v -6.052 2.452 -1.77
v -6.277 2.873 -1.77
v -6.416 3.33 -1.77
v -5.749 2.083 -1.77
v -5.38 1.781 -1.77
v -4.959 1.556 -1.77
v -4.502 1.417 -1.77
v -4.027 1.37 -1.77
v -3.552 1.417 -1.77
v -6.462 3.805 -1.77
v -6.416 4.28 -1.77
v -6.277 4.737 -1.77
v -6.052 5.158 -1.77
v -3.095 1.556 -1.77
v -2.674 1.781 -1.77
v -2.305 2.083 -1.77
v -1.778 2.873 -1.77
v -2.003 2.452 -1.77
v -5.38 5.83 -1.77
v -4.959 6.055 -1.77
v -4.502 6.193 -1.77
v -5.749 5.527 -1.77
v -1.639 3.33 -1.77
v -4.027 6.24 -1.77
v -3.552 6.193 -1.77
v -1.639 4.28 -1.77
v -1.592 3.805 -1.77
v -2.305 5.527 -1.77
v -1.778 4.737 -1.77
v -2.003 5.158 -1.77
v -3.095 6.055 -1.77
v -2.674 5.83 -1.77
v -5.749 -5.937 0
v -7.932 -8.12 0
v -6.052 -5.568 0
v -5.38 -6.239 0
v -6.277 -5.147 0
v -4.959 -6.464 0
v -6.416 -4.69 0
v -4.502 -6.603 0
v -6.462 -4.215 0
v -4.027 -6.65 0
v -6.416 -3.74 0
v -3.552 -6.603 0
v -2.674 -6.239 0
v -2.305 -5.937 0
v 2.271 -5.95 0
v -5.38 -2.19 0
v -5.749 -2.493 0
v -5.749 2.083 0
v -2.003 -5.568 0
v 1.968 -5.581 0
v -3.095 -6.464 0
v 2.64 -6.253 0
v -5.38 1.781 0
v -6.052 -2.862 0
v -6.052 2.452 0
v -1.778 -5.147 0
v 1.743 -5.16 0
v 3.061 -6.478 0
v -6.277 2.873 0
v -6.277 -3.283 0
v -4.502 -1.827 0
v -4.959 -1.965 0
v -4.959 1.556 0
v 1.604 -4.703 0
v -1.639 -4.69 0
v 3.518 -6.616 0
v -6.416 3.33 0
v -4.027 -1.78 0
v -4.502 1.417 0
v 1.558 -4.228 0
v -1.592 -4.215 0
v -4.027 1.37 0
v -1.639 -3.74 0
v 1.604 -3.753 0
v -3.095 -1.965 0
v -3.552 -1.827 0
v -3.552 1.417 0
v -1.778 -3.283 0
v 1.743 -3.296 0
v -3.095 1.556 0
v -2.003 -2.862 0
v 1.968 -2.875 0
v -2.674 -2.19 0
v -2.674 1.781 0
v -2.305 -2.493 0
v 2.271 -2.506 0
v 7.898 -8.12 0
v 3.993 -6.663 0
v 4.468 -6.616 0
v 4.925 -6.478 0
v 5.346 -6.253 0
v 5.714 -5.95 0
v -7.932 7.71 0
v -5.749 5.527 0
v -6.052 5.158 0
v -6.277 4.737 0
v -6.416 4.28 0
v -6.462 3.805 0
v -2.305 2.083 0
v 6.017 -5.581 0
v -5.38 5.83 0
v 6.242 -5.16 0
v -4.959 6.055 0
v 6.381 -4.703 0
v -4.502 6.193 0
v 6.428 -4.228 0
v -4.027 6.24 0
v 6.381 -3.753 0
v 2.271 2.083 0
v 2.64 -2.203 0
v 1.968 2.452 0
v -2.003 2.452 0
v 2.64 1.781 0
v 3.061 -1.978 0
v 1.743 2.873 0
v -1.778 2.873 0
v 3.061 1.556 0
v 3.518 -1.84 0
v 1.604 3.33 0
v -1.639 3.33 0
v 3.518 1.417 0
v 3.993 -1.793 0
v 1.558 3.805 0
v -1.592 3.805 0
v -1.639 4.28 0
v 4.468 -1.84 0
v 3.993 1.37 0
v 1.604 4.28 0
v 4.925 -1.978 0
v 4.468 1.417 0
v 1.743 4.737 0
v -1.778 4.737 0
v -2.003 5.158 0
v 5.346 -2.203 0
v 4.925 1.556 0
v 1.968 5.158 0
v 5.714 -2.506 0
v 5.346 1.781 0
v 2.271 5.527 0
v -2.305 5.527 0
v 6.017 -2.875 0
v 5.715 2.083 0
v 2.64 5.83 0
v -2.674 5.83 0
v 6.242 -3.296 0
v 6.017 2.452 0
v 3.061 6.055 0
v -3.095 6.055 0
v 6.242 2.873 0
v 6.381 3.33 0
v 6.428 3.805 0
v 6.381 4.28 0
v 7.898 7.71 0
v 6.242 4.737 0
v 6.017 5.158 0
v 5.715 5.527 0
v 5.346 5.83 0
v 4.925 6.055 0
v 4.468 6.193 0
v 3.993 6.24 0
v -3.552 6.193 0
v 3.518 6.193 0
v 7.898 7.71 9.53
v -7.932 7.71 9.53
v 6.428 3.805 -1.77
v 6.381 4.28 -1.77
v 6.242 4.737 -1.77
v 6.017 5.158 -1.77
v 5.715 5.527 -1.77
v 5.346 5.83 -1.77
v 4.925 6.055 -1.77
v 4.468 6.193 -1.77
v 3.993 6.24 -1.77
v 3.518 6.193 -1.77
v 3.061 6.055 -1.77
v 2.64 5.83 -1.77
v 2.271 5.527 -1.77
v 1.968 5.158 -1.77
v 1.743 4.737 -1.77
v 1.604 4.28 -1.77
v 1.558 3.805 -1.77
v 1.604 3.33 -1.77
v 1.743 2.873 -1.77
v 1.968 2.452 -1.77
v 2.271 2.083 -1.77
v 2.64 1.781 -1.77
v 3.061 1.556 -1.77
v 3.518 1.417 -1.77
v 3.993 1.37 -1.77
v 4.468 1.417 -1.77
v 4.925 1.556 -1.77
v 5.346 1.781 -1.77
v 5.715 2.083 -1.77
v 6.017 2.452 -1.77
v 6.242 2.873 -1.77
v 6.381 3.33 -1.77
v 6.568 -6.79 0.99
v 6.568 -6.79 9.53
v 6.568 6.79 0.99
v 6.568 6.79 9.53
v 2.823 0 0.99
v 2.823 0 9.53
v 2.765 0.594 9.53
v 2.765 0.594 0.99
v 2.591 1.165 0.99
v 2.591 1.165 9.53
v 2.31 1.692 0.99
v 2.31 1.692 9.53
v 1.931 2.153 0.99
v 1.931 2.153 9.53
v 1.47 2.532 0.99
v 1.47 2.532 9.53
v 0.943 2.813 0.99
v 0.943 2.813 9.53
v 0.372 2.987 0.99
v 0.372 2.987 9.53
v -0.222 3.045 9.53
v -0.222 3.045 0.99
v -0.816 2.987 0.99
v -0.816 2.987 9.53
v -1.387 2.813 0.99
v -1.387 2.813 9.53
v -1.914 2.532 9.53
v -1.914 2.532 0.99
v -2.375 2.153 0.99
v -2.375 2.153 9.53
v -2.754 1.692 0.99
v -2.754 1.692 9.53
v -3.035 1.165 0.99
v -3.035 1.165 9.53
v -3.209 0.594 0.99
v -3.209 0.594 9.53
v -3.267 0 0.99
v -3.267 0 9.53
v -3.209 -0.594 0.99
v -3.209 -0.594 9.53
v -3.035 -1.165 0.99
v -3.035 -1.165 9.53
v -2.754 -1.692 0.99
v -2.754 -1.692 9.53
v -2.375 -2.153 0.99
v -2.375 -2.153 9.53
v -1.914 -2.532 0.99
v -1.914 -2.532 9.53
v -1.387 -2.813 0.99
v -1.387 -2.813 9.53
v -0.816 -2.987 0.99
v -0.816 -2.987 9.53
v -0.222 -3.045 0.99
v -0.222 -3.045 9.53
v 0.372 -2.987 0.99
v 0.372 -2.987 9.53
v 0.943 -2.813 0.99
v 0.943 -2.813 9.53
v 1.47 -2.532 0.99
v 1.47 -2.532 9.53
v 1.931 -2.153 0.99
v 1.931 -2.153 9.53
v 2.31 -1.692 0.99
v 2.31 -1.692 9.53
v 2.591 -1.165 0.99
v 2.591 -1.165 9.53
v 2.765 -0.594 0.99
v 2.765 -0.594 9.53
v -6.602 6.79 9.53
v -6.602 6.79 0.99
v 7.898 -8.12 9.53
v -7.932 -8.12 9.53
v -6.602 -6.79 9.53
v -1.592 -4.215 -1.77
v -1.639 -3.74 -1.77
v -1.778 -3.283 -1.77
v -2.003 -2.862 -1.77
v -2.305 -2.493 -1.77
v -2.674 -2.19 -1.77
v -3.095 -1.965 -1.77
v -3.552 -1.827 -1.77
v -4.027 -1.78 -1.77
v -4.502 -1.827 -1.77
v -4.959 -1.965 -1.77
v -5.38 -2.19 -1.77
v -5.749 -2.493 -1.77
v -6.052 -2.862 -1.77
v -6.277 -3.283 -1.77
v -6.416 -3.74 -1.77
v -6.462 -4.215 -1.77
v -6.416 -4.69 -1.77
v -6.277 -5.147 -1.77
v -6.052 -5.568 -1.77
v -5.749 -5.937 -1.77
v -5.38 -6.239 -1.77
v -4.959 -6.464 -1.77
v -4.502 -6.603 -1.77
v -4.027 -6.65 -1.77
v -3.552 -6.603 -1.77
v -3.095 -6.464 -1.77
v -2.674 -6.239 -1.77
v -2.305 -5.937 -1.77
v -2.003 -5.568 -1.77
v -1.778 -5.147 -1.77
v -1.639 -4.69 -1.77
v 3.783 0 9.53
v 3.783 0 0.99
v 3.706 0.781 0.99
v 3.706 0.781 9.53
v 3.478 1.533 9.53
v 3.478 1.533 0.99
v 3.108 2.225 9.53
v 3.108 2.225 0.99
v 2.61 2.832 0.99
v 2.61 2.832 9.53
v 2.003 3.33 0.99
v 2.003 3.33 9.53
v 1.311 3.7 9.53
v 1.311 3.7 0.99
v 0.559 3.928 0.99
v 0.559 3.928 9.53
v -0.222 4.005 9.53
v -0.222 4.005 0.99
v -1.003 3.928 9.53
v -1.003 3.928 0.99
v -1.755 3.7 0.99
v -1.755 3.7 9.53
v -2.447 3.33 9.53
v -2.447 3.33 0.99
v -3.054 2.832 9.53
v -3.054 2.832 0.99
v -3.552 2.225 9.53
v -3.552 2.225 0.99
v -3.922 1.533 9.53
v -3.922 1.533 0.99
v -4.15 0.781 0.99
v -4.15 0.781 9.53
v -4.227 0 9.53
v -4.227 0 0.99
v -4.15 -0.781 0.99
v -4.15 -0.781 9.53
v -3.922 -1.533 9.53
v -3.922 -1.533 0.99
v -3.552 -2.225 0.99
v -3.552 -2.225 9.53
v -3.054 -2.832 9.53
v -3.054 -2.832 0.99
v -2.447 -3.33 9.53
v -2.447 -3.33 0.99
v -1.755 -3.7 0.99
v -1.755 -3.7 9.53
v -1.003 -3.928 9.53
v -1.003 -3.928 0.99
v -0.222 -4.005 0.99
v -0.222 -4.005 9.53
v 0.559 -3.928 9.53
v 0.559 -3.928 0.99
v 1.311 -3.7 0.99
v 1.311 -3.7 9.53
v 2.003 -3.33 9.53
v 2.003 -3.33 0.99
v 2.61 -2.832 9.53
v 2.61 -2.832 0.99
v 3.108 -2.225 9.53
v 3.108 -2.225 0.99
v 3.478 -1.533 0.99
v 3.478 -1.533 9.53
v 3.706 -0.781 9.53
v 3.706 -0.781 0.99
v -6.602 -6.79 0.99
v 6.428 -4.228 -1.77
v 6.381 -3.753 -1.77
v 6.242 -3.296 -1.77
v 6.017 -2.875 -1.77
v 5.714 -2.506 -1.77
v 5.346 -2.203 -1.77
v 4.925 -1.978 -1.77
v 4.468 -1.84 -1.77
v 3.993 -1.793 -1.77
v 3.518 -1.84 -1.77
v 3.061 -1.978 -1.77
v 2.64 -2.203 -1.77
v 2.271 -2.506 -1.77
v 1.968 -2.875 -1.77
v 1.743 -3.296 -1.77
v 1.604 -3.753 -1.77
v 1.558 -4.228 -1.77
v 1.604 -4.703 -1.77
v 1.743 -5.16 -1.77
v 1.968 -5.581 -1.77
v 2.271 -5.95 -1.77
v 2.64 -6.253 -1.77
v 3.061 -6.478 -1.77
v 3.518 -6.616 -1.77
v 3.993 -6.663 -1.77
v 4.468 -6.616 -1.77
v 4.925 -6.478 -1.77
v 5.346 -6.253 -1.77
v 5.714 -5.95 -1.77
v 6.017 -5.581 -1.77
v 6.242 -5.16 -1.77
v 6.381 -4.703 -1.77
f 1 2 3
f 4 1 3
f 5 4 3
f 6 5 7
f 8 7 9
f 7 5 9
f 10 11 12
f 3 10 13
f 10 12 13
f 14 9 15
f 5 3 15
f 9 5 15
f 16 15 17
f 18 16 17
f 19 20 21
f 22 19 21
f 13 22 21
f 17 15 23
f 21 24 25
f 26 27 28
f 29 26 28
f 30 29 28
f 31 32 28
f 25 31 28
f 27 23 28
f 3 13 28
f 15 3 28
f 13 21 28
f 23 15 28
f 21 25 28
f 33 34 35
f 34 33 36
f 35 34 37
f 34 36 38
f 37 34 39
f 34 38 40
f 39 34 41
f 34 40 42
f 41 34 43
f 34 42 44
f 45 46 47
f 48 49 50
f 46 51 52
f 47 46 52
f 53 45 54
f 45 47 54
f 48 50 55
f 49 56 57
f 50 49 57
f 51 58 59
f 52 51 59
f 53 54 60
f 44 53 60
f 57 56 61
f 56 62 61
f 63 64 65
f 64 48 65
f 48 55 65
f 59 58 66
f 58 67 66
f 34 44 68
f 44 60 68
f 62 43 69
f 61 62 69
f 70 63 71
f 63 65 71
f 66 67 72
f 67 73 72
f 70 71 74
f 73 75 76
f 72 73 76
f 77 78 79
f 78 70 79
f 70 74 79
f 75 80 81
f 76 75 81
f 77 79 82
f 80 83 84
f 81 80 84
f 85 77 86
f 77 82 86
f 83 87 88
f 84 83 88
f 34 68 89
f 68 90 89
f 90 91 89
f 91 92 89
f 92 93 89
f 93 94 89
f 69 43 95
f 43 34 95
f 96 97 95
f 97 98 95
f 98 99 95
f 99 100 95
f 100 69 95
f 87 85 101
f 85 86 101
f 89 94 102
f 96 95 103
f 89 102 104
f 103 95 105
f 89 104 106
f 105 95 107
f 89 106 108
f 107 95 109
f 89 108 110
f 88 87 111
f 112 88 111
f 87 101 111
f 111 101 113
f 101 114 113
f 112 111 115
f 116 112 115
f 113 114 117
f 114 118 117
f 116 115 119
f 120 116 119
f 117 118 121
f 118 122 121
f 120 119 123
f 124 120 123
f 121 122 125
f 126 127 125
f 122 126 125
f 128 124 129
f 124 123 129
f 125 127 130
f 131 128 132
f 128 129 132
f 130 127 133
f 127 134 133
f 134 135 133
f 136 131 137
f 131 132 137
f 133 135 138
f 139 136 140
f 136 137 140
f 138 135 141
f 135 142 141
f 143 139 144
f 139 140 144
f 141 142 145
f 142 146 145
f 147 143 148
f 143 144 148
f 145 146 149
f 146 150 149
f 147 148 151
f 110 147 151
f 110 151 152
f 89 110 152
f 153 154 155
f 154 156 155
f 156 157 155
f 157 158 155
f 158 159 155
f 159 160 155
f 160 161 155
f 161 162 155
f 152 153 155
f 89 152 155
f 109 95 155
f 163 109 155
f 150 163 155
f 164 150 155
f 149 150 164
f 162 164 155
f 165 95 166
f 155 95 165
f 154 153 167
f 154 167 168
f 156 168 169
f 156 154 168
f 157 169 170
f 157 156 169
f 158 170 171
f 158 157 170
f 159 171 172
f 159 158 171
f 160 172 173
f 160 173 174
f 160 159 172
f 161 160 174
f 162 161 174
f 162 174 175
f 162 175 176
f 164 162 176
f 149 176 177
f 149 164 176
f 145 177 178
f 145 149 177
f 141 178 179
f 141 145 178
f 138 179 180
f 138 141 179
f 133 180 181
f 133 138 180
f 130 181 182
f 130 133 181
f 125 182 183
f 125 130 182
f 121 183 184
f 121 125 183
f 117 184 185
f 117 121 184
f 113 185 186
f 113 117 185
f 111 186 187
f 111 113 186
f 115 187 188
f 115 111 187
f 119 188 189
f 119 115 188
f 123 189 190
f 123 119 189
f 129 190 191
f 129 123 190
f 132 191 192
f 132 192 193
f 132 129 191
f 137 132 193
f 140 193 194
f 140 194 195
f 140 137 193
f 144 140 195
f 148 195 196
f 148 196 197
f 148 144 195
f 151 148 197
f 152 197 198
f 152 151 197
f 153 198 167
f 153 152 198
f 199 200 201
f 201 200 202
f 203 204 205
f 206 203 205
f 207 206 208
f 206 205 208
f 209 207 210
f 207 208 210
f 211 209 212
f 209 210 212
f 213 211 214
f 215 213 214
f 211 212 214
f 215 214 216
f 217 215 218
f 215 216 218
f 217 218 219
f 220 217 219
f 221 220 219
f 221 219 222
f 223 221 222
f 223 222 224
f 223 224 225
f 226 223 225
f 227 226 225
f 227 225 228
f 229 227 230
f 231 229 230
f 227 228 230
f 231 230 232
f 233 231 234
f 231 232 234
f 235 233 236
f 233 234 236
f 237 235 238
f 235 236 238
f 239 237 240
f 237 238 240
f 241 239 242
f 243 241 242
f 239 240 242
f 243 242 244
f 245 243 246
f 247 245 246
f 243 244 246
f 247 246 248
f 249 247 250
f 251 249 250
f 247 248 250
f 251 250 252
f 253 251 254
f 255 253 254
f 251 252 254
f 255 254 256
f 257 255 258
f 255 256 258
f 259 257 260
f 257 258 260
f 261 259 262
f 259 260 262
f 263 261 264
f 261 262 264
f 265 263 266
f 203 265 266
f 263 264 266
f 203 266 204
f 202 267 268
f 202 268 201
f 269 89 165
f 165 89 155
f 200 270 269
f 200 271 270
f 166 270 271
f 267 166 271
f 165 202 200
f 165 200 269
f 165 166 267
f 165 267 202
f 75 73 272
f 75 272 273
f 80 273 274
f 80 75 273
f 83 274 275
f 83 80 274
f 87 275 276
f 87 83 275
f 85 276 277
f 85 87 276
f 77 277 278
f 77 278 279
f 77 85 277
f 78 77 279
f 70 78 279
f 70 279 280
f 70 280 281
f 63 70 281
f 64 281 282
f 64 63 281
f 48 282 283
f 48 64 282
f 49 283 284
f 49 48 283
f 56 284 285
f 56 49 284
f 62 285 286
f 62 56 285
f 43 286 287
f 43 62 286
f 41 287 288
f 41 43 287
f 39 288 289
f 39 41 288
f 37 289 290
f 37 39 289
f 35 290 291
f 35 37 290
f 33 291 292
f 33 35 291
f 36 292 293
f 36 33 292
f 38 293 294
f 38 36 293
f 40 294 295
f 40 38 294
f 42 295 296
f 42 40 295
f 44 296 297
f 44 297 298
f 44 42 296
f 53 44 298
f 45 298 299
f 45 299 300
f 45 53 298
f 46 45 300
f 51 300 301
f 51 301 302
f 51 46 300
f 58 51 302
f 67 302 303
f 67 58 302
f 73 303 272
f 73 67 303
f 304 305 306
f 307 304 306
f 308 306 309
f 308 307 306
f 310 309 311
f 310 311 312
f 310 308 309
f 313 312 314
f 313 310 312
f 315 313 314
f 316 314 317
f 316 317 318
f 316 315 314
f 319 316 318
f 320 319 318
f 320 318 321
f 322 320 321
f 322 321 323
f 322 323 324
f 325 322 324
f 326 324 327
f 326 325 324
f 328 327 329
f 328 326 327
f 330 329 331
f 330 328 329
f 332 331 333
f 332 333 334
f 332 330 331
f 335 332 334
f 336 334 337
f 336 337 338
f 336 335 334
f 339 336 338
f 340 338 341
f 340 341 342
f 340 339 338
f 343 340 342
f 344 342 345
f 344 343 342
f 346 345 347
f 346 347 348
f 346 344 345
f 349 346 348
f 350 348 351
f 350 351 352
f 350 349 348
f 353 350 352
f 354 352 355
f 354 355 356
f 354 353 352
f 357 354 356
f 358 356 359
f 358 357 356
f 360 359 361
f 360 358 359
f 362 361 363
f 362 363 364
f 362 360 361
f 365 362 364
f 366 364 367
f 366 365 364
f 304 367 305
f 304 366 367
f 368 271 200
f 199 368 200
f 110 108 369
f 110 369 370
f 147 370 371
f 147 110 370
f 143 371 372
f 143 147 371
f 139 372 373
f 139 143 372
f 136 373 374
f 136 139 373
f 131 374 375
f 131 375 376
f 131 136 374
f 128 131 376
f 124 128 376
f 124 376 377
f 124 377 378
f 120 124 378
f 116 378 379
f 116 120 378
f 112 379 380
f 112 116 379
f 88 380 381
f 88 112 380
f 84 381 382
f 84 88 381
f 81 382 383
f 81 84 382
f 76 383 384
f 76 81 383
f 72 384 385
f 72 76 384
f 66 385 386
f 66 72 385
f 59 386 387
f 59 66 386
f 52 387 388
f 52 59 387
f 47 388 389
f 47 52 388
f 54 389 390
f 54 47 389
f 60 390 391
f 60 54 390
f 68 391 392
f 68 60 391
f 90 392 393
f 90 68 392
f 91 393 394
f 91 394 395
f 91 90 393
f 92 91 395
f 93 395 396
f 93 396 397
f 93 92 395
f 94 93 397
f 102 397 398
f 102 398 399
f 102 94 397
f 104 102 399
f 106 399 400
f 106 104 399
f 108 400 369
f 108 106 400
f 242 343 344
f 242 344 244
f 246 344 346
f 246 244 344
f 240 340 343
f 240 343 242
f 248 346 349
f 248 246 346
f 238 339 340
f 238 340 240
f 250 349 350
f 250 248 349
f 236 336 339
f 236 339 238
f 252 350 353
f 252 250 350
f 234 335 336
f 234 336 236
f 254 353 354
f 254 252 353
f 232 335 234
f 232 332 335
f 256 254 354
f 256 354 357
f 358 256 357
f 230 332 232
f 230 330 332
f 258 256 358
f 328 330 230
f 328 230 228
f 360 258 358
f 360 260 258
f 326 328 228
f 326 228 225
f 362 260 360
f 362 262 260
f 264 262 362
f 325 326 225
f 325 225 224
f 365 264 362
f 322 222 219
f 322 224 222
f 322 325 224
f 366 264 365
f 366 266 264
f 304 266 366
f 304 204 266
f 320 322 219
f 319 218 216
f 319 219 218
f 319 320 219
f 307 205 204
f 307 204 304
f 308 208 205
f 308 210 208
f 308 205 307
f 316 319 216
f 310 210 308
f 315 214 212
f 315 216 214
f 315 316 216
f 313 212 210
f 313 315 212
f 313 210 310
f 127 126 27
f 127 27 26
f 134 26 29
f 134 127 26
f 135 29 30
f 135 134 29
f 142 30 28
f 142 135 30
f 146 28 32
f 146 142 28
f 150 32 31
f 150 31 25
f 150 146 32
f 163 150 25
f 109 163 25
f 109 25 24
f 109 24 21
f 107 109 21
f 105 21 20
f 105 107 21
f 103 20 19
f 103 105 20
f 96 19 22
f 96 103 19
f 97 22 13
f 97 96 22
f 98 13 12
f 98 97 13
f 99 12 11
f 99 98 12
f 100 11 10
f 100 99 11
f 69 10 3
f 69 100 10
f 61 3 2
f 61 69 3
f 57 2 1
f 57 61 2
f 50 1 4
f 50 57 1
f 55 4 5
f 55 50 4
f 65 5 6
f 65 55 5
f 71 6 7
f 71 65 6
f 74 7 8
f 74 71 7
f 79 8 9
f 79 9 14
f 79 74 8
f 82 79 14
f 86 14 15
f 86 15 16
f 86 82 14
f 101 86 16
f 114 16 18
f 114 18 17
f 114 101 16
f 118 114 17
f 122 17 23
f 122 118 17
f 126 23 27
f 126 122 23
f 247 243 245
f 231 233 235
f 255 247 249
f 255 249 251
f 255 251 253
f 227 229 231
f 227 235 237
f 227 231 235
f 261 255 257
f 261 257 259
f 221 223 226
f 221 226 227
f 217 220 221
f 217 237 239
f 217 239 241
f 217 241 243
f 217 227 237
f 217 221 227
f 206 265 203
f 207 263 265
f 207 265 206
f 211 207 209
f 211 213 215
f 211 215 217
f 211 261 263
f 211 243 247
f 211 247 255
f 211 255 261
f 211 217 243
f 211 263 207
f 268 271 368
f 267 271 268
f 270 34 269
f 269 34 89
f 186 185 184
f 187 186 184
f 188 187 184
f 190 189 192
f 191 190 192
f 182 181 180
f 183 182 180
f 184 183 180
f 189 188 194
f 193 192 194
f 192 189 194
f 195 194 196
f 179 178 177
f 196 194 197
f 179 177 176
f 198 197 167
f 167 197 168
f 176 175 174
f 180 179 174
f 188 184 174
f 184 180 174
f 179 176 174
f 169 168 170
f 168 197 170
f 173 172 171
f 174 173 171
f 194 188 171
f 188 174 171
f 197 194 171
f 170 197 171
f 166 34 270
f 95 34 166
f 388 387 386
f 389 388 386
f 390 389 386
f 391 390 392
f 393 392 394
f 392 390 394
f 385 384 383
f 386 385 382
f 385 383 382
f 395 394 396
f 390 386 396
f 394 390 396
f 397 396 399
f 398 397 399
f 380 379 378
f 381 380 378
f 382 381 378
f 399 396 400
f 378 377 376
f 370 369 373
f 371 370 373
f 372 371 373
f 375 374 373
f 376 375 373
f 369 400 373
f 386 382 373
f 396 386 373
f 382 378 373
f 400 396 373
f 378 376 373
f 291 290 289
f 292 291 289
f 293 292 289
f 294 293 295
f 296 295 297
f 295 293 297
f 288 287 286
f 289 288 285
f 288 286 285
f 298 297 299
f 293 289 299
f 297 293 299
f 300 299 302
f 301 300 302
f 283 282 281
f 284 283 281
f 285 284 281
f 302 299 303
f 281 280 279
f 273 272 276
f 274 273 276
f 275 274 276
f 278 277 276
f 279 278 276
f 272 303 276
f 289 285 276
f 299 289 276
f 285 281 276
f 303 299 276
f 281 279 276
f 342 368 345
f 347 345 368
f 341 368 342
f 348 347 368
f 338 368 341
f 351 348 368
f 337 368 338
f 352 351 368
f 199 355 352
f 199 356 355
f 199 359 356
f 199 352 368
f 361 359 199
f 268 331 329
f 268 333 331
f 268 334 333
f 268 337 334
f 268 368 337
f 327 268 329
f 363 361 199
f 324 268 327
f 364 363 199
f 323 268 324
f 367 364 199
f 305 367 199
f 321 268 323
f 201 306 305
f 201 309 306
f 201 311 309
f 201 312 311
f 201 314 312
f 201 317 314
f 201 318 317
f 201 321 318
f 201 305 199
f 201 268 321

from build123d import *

# Parameters (mm, degrees)
F0_W     = 15.83
F0_H     = 15.83
F0_R     = 2.435
F1_DEPTH = 9.53
F2_DEPTH = 1.77
F3_W     = 13.17
F3_H     = 13.5795233832
F3_R     = 4.0052383084
F3_R_2   = 3.0452383084
F4_DEPTH = 8.54


with BuildPart() as f1:
    # F0 (on Top) → F1 (new body)
    with BuildSketch(Plane.XY):
        with Locations((-0.0172966565, -0.2047616916)):
            Rectangle(F0_W, F0_H)
        with Locations((-4.0272966565, -4.2147616916)):
            Circle(F0_R, mode=Mode.SUBTRACT)
        with Locations((3.9926922612, -4.2280943334)):
            Circle(F0_R, mode=Mode.SUBTRACT)
        with Locations((-4.0272966565, 3.8052383084)):
            Circle(F0_R, mode=Mode.SUBTRACT)
        with Locations((3.9927033435, 3.8052383084)):
            Circle(F0_R, mode=Mode.SUBTRACT)
        with Locations((-4.0272966565, -4.2147616916)):
            Circle(F0_R)
        with Locations((3.9926922612, -4.2280943334)):
            Circle(F0_R)
        with Locations((3.9927033435, 3.8052383084)):
            Circle(F0_R)
        with Locations((-4.0272966565, 3.8052383084)):
            Circle(F0_R)
    extrude(amount=F1_DEPTH)

    # F0 (on Top) → F2 (join)
    with BuildSketch(Plane.XY):
        with Locations((-4.0272966565, -4.2147616916)):
            Circle(F0_R)
        with Locations((3.9926922612, -4.2280943334)):
            Circle(F0_R)
        with Locations((-4.0272966565, 3.8052383084)):
            Circle(F0_R)
        with Locations((3.9927033435, 3.8052383084)):
            Circle(F0_R)
    extrude(amount=-F2_DEPTH)

    # F3 (on face) → F4 (cut)
    with BuildSketch(Plane.XY.offset(9.53)):
        with Locations((-0.0172966565, 0)):
            Rectangle(F3_W, F3_H)
        with Locations((-0.2220583481, 0)):
            Circle(F3_R, mode=Mode.SUBTRACT)
        with Locations((-0.2220583481, 0)):
            Circle(F3_R_2)
    extrude(amount=-F4_DEPTH, mode=Mode.SUBTRACT)


solid = f1.part
